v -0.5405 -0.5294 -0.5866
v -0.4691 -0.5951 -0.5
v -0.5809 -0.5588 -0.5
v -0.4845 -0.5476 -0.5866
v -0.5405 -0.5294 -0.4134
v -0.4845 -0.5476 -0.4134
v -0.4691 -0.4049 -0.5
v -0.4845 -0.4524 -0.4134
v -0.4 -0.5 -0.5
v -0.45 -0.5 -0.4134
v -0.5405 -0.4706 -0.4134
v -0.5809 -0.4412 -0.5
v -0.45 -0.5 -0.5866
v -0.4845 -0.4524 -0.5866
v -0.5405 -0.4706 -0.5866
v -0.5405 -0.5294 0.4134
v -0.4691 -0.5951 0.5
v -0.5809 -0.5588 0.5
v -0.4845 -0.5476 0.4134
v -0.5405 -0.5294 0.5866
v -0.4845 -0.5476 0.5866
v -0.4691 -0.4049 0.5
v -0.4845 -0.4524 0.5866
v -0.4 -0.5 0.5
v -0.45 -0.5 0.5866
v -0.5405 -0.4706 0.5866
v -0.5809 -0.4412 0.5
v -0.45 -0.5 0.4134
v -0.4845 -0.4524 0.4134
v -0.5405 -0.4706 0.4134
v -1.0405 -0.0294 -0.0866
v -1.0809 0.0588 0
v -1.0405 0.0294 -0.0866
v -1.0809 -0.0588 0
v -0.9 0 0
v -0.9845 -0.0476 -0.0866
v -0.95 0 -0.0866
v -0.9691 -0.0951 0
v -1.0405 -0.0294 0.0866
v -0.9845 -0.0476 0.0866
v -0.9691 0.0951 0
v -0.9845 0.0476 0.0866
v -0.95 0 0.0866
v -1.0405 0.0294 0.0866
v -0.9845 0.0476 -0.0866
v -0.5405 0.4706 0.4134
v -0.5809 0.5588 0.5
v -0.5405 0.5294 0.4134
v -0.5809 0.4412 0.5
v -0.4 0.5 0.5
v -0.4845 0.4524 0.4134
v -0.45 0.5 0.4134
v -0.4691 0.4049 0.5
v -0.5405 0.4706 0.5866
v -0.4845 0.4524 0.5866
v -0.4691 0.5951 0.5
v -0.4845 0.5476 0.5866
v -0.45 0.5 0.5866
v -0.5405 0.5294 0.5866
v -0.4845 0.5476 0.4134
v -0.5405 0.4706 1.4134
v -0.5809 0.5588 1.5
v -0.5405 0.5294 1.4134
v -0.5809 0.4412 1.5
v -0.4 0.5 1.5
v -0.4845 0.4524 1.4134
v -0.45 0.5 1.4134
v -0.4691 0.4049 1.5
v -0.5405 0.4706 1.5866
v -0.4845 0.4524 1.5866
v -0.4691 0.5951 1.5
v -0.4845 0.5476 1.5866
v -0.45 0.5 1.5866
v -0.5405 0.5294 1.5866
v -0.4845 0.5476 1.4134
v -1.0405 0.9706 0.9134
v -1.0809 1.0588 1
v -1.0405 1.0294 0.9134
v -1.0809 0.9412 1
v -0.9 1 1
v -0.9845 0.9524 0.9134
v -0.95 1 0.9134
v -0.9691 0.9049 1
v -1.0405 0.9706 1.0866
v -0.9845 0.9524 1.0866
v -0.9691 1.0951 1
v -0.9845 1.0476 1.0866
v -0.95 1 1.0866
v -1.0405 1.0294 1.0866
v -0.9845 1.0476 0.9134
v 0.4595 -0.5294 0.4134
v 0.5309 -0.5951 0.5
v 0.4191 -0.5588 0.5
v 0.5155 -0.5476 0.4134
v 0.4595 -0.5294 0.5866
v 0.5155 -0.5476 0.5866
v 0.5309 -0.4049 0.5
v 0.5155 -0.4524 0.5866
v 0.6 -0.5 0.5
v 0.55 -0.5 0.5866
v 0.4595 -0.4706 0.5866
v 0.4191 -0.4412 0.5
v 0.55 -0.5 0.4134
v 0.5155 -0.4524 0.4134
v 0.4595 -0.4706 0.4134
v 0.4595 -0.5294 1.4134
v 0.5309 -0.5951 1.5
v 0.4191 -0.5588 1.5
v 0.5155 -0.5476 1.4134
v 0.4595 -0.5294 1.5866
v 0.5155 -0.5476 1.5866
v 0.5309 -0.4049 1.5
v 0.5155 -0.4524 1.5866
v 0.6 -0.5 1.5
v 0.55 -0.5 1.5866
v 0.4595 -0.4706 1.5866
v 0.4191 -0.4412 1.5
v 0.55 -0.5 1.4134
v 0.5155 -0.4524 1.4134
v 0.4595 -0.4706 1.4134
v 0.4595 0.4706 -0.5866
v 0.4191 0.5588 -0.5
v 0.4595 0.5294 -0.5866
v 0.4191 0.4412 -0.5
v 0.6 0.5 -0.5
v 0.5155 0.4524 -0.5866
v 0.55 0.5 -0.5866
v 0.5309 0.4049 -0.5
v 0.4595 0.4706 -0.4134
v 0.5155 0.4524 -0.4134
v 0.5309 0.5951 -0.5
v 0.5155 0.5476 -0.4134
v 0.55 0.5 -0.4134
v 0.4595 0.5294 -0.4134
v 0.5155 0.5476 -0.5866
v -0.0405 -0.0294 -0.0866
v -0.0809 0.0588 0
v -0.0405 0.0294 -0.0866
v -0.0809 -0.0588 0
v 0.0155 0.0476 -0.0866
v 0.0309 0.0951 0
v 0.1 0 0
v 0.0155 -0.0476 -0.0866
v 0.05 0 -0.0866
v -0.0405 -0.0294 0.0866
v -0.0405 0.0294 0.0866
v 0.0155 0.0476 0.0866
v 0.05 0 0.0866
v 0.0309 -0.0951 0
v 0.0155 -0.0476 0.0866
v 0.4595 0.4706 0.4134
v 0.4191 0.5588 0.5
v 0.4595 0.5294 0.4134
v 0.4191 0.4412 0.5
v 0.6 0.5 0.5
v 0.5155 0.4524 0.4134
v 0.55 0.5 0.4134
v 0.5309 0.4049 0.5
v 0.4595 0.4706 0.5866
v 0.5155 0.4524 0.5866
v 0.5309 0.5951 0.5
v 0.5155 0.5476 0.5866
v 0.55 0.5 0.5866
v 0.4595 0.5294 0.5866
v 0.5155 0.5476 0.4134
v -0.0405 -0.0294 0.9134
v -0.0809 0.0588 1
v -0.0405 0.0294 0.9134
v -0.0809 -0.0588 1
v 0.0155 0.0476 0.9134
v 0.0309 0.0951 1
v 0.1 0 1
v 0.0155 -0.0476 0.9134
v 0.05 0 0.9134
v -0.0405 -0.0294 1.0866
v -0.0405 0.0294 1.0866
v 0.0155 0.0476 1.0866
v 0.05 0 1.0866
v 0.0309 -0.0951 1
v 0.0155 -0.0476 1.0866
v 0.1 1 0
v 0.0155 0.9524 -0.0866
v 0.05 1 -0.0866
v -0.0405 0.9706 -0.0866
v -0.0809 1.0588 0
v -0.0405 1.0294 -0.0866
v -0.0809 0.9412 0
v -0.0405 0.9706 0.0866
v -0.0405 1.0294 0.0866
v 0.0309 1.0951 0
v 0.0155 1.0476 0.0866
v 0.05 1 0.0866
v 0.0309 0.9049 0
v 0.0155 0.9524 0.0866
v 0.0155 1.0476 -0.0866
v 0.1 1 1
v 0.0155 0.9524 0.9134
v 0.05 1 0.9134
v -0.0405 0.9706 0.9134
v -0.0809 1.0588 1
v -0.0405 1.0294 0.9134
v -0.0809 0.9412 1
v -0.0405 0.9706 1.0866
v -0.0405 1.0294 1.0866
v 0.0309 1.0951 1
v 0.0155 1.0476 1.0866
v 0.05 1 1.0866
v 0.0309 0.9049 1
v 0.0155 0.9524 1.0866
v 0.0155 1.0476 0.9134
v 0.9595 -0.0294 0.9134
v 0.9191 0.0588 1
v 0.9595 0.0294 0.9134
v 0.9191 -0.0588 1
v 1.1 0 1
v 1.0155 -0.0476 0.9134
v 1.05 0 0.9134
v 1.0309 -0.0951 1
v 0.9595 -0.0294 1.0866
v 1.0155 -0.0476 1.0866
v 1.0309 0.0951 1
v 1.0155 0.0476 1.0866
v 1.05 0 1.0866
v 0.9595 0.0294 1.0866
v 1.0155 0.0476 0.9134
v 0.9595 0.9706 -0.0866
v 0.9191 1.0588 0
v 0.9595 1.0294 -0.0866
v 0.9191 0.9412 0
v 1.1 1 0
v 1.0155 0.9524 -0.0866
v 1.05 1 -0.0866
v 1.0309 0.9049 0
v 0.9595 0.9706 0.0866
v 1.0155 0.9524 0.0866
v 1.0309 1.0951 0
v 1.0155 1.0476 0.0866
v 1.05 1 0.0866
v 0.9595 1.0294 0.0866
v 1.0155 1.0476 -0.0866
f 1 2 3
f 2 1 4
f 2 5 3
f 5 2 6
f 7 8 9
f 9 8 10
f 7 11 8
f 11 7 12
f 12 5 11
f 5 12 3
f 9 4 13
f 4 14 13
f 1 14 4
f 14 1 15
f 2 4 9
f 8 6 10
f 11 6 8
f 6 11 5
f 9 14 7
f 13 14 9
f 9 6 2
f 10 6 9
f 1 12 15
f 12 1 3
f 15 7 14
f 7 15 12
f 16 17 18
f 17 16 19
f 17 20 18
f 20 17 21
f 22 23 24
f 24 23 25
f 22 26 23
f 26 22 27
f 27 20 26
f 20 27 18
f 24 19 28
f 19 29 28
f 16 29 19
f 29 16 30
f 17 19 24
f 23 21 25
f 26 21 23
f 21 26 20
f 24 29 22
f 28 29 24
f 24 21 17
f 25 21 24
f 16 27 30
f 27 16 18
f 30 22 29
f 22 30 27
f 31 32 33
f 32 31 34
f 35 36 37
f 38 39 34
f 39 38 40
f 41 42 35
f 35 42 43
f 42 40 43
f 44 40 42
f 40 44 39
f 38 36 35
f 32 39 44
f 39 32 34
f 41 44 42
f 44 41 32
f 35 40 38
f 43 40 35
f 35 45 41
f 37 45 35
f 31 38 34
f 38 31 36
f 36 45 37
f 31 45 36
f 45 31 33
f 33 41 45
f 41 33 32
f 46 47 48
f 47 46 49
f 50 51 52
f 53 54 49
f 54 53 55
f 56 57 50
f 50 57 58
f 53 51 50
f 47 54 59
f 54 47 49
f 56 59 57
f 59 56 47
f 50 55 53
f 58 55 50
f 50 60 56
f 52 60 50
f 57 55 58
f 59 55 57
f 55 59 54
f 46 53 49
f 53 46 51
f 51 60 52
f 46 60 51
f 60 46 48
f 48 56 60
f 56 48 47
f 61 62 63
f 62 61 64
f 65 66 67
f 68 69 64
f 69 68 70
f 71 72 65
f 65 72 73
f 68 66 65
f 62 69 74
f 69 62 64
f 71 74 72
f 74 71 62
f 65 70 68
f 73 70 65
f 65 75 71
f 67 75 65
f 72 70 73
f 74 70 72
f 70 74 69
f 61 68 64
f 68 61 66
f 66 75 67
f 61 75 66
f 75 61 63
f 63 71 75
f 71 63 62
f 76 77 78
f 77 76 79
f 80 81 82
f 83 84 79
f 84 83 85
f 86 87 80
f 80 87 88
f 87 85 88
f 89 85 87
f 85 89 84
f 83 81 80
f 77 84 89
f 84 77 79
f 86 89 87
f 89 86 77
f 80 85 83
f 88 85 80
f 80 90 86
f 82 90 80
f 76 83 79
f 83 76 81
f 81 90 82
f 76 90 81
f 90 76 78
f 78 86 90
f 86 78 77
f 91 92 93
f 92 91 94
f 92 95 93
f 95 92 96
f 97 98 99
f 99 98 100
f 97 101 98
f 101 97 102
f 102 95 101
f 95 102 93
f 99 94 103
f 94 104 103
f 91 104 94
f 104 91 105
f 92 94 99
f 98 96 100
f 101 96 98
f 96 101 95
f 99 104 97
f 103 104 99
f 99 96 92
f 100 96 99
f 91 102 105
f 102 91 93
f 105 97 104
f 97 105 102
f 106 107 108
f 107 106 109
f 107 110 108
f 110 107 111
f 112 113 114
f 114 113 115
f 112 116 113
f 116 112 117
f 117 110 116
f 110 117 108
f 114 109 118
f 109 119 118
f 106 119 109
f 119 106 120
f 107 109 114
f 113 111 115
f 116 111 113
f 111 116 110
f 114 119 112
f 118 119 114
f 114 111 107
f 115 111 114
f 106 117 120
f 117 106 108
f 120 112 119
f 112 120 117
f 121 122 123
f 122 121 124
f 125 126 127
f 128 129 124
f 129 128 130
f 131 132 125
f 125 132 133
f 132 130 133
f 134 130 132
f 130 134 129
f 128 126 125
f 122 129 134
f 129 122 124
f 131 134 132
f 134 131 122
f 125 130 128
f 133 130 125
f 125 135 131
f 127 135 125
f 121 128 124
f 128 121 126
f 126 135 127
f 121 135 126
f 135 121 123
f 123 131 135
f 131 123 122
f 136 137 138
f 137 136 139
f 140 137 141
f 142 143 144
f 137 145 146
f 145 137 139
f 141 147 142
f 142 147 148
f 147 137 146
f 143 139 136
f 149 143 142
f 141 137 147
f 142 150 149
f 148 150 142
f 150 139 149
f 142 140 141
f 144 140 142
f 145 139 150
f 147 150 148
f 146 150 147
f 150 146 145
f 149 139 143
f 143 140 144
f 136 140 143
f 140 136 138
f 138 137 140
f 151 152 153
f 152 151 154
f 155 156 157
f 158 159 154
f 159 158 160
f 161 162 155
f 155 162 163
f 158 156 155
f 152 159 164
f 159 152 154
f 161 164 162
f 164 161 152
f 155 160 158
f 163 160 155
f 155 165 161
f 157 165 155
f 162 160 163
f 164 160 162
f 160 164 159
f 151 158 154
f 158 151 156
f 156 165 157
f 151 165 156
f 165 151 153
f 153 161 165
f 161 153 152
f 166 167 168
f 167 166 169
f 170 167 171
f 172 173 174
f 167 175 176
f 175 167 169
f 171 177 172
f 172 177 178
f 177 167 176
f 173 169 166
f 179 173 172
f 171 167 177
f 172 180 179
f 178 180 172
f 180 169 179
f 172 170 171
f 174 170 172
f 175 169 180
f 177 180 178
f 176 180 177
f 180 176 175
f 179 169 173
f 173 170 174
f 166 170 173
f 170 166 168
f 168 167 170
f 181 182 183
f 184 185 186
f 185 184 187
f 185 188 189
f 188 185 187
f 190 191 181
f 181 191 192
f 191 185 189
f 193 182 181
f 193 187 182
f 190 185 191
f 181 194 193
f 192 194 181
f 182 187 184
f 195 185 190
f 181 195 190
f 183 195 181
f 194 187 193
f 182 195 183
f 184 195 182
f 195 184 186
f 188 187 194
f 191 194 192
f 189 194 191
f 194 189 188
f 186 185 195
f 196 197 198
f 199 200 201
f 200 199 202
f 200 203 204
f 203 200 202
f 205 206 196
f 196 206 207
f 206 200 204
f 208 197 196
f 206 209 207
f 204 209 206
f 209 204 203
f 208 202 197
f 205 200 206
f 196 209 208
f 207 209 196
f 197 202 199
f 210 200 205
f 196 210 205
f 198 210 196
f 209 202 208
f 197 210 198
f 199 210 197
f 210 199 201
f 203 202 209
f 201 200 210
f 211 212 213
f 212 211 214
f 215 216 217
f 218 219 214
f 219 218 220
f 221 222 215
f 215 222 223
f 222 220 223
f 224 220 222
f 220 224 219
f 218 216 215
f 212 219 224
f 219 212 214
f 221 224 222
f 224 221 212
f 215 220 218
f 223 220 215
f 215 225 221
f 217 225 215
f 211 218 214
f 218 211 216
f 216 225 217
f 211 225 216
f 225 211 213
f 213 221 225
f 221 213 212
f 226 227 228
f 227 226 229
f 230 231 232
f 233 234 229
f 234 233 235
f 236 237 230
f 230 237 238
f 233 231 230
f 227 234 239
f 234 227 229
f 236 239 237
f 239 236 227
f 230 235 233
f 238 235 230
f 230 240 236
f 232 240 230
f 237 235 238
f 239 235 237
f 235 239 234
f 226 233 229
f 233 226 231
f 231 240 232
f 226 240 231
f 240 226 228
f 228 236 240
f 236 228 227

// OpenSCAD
// file: 3d_tetrahedres.scad
use <lattice.scad>;

// Check if a vertex is adjacent to the central layer (that sets the size of processor).
// n as n_code in article (starts at 1).
function central_layer(x, y, z, n) = ((x+z == n-2) || (x+z == n-1)) ? true : false;

// Elementary tetrahedron as described in Equation (18) of arXiv:1311.0879.
// x, y, z : coordinates of vector x in arXiv:1311.0879
// s : +- 1
// permut : integer between 0 and 5 (included) that describe the permutation (a, b, c) :
//          0 : (a, b, c) = (i, j, k)
//          1 : (a, b, c) = (i, k, j)
//          2 : (a, b, c) = (j, i, k)
//          3 : (a, b, c) = (j, k, i)
//          4 : (a, b, c) = (k, i, j)
//          5 : (a, b, c) = (k, j, i)
// n : we keep only tetrahedron included in the code structure indexed by n.
//     n is as in Equation (19) of arXiv:1311.0879 (starts at 1).
//     use -1 for no filter
 module tetraedre (x, y, z, s, permut, n) {
     // if (permut==0) {xa=1; ya=0; za=0; xb=0; yb=1; zb=0; xc=0; yc=0; zc=1;}
     // if (permut==1) {xa=1; ya=0; za=0; xb=0; yb=0; zb=1; xc=0; yc=1; zc=0;}
     // if (permut==2) {xa=0; ya=1; za=0; xb=1; yb=0; zb=0; xc=0; yc=0; zc=1;}
     // if (permut==3) {xa=0; ya=1; za=0; xb=0; yb=0; zb=1; xc=1; yc=0; zc=0;}
     // if (permut==4) {xa=0; ya=0; za=1; xb=1; yb=0; zb=0; xc=0; yc=1; zc=0;}
     // if (permut==5) {xa=0; ya=0; za=1; xb=0; yb=1; zb=0; xc=1; yc=0; zc=0;}
     xa = permut==0 || permut==1 ? 1 : 0;
     ya = permut==2 || permut==3 ? 1 : 0;
     za = permut==4 || permut==5 ? 1 : 0;
     xb = permut==2 || permut==4 ? 1 : 0;
     yb = permut==0 || permut==5 ? 1 : 0;
     zb = permut==1 || permut==3 ? 1 : 0;
     xc = permut==3 || permut==5 ? 1 : 0;
     yc = permut==1 || permut==4 ? 1 : 0;
     zc = permut==0 || permut==2 ? 1 : 0;

     // Coordinates of vertices of the tetrahedron.
     x1=x; y1=y; z1=z;                                               // x
     x2=x+xa; y2=y+ya; z2=z+za;                                      // x + a
     x3=x+(xa+s*xb+xc)/2; y3=y+(ya+s*yb+yc)/2; z3=z+(za+s*zb+zc)/2;  // x + (a+sb+c)/2
     x4=x+(xa+s*xb-xc)/2; y4=y+(ya+s*yb-yc)/2; z4=z+(za+s*zb-zc)/2;  // x + (a+sb-c)/2

     if (n == -1 || (
         filtre(x1, y1, z1, n)
         && filtre(x2, y2, z2, n)
         && filtre(x3, y3, z3, n)
         && filtre(x4, y4, z4, n)
     )) {
         // echo(x, y, z, s, permut, n);
         if (central_layer(x1, y1, z1, n)
             && central_layer(x2, y2, z2, n)
             && central_layer(x3, y3, z3, n)
             && central_layer(x4, y4, z4, n))
            {
             echo("One central tetraedron");  // For counting
             color("red")
             polyhedron(
                 points=[[x1,y1,z1], [x2,y2,z2], [x3,y3,z3], [x4,y4,z4]],
                 faces=[[0,1,2], [0,1,3], [0,2,3], [1,3,2]]
                );
            }
         else {
             polyhedron(
                 points=[[x1,y1,z1], [x2,y2,z2], [x3,y3,z3], [x4,y4,z4]],
                 faces=[[0,1,2], [0,1,3], [0,2,3], [1,3,2]]
                );
            }
        }
    }


n = 3;
grille(n);

for (x = [-1:n-1]) {
        for (y = [-1:n-1]) {
            for (z = [-1:n-1]) {
                for (s=[-1:2:1]) {
                    for (permut = [0:5]) {
                        tetraedre(x, y, z, s, permut, n);
                    }
                }
            }
        }
    }
// file: lattice.scad
// Centered cubic grid, as presented in Equation (18) from arXiv:1311.0879


//  Uncut centered cubic grid.
module maille(nb) {
    // Diameter of small balls
    rad = 0.1;
    for (x = [0:nb]) {
        for (y = [0:nb]) {
            for (z = [0:nb]) {
                type = abs((x + y + z) % 2);  // Correspond to color
                x2 = x+0.5; y2 = y+0.5; z2 = z+0.5;
                if (type == 0) {
                        color("red") translate([x, y, z]) sphere(rad);
                        color("blue") translate([x2, y2, z2]) sphere(rad);
                        }
                if (type == 1) {
                    color("green") translate([x, y, z]) sphere(rad);
                    color("yellow") translate([x2, y2, z2]) sphere(rad);
                    }
                }
            }
        }
    }



// Check Equation (19) of arXiv:1311.0879 (n stars at 1).
function filtre(x, y, z, n) = ((x+y+z <= 0 + 2*(n-1))
                               && (x-y-z <= 1/2)
                               && (-x+y-z <= 1)
                               && (-x-y+z <= 3/2)) ? true : false;


// Grid as presented in Equations (18) and (19) of arXiv:1311.0879.
// n : number n in Equation (19): index in the code family, starts at 1.
module grille(n) {
    // Diameter of small balls
    rad = 0.1;
    for (x = [-1:n-1]) {
        for (y = [-1:n-1]) {
            for (z = [-1:n-1]) {
                type = abs((x + y + z) % 2);  // Correspond to color
                if (filtre(x, y, z, n)) {
                    if (type == 0) {
                        color("red") translate([x, y, z]) sphere(rad);
                        }
                    if (type == 1) {
                        color("green") translate([x, y, z]) sphere(rad);
                        }
                    }
                x2 = x+0.5; y2 = y+0.5; z2 = z+0.5;
                if (filtre(x2, y2, z2, n)) {
                    if (type == 0) {
                        color("blue") translate([x2, y2, z2]) sphere(rad);
                        }
                    if (type == 1) {
                        color("yellow") translate([x2, y2, z2]) sphere(rad);
                        }
                    }
                }
            }
        }
    }

//maille(2);
grille(2);
// main file
use <lattice.scad>;
use <3d_tetrahedres.scad>;

// Layer 1 : 1 qubit
color("black") tetraedre(-1, 0, 0, -1, 0, 2);

// Layer 2 : 10 qubit
color("Chartreuse") tetraedre(-1, 0, 0, 1, 1, 2);
color("Chartreuse") tetraedre(0, 0, 0, -1, 5, 2);
color("Chartreuse") tetraedre(0, 0, 0, -1, 4, 2);
color("Chartreuse") tetraedre(0, 0, 0, 1, 5, 2);
color("Chartreuse") tetraedre(0, 0, 0, 1, 4, 2);
color("Chartreuse") tetraedre(0, 0, 0, 1, 3, 2);
color("Chartreuse") tetraedre(0, 0, 0, 1, 2, 2);
color("Chartreuse") tetraedre(0, 0, 1, -1, 0, 2);
color("Chartreuse") tetraedre(0, 0, 1, -1, 1, 2);
color("Chartreuse") tetraedre(0, 1, 0, -1, 0, 2);

// Layer 3 : 4 qubits
color("Magenta") tetraedre(0, 0, 1, -1, 3, 2);
color("Magenta") tetraedre(0, 1, 0, -1, 5, 2);
color("Magenta") tetraedre(0, 0, 1, -1, 2, 2);
color("Magenta") tetraedre(-1, 1, 1, -1, 0, 2);

grille(2);
